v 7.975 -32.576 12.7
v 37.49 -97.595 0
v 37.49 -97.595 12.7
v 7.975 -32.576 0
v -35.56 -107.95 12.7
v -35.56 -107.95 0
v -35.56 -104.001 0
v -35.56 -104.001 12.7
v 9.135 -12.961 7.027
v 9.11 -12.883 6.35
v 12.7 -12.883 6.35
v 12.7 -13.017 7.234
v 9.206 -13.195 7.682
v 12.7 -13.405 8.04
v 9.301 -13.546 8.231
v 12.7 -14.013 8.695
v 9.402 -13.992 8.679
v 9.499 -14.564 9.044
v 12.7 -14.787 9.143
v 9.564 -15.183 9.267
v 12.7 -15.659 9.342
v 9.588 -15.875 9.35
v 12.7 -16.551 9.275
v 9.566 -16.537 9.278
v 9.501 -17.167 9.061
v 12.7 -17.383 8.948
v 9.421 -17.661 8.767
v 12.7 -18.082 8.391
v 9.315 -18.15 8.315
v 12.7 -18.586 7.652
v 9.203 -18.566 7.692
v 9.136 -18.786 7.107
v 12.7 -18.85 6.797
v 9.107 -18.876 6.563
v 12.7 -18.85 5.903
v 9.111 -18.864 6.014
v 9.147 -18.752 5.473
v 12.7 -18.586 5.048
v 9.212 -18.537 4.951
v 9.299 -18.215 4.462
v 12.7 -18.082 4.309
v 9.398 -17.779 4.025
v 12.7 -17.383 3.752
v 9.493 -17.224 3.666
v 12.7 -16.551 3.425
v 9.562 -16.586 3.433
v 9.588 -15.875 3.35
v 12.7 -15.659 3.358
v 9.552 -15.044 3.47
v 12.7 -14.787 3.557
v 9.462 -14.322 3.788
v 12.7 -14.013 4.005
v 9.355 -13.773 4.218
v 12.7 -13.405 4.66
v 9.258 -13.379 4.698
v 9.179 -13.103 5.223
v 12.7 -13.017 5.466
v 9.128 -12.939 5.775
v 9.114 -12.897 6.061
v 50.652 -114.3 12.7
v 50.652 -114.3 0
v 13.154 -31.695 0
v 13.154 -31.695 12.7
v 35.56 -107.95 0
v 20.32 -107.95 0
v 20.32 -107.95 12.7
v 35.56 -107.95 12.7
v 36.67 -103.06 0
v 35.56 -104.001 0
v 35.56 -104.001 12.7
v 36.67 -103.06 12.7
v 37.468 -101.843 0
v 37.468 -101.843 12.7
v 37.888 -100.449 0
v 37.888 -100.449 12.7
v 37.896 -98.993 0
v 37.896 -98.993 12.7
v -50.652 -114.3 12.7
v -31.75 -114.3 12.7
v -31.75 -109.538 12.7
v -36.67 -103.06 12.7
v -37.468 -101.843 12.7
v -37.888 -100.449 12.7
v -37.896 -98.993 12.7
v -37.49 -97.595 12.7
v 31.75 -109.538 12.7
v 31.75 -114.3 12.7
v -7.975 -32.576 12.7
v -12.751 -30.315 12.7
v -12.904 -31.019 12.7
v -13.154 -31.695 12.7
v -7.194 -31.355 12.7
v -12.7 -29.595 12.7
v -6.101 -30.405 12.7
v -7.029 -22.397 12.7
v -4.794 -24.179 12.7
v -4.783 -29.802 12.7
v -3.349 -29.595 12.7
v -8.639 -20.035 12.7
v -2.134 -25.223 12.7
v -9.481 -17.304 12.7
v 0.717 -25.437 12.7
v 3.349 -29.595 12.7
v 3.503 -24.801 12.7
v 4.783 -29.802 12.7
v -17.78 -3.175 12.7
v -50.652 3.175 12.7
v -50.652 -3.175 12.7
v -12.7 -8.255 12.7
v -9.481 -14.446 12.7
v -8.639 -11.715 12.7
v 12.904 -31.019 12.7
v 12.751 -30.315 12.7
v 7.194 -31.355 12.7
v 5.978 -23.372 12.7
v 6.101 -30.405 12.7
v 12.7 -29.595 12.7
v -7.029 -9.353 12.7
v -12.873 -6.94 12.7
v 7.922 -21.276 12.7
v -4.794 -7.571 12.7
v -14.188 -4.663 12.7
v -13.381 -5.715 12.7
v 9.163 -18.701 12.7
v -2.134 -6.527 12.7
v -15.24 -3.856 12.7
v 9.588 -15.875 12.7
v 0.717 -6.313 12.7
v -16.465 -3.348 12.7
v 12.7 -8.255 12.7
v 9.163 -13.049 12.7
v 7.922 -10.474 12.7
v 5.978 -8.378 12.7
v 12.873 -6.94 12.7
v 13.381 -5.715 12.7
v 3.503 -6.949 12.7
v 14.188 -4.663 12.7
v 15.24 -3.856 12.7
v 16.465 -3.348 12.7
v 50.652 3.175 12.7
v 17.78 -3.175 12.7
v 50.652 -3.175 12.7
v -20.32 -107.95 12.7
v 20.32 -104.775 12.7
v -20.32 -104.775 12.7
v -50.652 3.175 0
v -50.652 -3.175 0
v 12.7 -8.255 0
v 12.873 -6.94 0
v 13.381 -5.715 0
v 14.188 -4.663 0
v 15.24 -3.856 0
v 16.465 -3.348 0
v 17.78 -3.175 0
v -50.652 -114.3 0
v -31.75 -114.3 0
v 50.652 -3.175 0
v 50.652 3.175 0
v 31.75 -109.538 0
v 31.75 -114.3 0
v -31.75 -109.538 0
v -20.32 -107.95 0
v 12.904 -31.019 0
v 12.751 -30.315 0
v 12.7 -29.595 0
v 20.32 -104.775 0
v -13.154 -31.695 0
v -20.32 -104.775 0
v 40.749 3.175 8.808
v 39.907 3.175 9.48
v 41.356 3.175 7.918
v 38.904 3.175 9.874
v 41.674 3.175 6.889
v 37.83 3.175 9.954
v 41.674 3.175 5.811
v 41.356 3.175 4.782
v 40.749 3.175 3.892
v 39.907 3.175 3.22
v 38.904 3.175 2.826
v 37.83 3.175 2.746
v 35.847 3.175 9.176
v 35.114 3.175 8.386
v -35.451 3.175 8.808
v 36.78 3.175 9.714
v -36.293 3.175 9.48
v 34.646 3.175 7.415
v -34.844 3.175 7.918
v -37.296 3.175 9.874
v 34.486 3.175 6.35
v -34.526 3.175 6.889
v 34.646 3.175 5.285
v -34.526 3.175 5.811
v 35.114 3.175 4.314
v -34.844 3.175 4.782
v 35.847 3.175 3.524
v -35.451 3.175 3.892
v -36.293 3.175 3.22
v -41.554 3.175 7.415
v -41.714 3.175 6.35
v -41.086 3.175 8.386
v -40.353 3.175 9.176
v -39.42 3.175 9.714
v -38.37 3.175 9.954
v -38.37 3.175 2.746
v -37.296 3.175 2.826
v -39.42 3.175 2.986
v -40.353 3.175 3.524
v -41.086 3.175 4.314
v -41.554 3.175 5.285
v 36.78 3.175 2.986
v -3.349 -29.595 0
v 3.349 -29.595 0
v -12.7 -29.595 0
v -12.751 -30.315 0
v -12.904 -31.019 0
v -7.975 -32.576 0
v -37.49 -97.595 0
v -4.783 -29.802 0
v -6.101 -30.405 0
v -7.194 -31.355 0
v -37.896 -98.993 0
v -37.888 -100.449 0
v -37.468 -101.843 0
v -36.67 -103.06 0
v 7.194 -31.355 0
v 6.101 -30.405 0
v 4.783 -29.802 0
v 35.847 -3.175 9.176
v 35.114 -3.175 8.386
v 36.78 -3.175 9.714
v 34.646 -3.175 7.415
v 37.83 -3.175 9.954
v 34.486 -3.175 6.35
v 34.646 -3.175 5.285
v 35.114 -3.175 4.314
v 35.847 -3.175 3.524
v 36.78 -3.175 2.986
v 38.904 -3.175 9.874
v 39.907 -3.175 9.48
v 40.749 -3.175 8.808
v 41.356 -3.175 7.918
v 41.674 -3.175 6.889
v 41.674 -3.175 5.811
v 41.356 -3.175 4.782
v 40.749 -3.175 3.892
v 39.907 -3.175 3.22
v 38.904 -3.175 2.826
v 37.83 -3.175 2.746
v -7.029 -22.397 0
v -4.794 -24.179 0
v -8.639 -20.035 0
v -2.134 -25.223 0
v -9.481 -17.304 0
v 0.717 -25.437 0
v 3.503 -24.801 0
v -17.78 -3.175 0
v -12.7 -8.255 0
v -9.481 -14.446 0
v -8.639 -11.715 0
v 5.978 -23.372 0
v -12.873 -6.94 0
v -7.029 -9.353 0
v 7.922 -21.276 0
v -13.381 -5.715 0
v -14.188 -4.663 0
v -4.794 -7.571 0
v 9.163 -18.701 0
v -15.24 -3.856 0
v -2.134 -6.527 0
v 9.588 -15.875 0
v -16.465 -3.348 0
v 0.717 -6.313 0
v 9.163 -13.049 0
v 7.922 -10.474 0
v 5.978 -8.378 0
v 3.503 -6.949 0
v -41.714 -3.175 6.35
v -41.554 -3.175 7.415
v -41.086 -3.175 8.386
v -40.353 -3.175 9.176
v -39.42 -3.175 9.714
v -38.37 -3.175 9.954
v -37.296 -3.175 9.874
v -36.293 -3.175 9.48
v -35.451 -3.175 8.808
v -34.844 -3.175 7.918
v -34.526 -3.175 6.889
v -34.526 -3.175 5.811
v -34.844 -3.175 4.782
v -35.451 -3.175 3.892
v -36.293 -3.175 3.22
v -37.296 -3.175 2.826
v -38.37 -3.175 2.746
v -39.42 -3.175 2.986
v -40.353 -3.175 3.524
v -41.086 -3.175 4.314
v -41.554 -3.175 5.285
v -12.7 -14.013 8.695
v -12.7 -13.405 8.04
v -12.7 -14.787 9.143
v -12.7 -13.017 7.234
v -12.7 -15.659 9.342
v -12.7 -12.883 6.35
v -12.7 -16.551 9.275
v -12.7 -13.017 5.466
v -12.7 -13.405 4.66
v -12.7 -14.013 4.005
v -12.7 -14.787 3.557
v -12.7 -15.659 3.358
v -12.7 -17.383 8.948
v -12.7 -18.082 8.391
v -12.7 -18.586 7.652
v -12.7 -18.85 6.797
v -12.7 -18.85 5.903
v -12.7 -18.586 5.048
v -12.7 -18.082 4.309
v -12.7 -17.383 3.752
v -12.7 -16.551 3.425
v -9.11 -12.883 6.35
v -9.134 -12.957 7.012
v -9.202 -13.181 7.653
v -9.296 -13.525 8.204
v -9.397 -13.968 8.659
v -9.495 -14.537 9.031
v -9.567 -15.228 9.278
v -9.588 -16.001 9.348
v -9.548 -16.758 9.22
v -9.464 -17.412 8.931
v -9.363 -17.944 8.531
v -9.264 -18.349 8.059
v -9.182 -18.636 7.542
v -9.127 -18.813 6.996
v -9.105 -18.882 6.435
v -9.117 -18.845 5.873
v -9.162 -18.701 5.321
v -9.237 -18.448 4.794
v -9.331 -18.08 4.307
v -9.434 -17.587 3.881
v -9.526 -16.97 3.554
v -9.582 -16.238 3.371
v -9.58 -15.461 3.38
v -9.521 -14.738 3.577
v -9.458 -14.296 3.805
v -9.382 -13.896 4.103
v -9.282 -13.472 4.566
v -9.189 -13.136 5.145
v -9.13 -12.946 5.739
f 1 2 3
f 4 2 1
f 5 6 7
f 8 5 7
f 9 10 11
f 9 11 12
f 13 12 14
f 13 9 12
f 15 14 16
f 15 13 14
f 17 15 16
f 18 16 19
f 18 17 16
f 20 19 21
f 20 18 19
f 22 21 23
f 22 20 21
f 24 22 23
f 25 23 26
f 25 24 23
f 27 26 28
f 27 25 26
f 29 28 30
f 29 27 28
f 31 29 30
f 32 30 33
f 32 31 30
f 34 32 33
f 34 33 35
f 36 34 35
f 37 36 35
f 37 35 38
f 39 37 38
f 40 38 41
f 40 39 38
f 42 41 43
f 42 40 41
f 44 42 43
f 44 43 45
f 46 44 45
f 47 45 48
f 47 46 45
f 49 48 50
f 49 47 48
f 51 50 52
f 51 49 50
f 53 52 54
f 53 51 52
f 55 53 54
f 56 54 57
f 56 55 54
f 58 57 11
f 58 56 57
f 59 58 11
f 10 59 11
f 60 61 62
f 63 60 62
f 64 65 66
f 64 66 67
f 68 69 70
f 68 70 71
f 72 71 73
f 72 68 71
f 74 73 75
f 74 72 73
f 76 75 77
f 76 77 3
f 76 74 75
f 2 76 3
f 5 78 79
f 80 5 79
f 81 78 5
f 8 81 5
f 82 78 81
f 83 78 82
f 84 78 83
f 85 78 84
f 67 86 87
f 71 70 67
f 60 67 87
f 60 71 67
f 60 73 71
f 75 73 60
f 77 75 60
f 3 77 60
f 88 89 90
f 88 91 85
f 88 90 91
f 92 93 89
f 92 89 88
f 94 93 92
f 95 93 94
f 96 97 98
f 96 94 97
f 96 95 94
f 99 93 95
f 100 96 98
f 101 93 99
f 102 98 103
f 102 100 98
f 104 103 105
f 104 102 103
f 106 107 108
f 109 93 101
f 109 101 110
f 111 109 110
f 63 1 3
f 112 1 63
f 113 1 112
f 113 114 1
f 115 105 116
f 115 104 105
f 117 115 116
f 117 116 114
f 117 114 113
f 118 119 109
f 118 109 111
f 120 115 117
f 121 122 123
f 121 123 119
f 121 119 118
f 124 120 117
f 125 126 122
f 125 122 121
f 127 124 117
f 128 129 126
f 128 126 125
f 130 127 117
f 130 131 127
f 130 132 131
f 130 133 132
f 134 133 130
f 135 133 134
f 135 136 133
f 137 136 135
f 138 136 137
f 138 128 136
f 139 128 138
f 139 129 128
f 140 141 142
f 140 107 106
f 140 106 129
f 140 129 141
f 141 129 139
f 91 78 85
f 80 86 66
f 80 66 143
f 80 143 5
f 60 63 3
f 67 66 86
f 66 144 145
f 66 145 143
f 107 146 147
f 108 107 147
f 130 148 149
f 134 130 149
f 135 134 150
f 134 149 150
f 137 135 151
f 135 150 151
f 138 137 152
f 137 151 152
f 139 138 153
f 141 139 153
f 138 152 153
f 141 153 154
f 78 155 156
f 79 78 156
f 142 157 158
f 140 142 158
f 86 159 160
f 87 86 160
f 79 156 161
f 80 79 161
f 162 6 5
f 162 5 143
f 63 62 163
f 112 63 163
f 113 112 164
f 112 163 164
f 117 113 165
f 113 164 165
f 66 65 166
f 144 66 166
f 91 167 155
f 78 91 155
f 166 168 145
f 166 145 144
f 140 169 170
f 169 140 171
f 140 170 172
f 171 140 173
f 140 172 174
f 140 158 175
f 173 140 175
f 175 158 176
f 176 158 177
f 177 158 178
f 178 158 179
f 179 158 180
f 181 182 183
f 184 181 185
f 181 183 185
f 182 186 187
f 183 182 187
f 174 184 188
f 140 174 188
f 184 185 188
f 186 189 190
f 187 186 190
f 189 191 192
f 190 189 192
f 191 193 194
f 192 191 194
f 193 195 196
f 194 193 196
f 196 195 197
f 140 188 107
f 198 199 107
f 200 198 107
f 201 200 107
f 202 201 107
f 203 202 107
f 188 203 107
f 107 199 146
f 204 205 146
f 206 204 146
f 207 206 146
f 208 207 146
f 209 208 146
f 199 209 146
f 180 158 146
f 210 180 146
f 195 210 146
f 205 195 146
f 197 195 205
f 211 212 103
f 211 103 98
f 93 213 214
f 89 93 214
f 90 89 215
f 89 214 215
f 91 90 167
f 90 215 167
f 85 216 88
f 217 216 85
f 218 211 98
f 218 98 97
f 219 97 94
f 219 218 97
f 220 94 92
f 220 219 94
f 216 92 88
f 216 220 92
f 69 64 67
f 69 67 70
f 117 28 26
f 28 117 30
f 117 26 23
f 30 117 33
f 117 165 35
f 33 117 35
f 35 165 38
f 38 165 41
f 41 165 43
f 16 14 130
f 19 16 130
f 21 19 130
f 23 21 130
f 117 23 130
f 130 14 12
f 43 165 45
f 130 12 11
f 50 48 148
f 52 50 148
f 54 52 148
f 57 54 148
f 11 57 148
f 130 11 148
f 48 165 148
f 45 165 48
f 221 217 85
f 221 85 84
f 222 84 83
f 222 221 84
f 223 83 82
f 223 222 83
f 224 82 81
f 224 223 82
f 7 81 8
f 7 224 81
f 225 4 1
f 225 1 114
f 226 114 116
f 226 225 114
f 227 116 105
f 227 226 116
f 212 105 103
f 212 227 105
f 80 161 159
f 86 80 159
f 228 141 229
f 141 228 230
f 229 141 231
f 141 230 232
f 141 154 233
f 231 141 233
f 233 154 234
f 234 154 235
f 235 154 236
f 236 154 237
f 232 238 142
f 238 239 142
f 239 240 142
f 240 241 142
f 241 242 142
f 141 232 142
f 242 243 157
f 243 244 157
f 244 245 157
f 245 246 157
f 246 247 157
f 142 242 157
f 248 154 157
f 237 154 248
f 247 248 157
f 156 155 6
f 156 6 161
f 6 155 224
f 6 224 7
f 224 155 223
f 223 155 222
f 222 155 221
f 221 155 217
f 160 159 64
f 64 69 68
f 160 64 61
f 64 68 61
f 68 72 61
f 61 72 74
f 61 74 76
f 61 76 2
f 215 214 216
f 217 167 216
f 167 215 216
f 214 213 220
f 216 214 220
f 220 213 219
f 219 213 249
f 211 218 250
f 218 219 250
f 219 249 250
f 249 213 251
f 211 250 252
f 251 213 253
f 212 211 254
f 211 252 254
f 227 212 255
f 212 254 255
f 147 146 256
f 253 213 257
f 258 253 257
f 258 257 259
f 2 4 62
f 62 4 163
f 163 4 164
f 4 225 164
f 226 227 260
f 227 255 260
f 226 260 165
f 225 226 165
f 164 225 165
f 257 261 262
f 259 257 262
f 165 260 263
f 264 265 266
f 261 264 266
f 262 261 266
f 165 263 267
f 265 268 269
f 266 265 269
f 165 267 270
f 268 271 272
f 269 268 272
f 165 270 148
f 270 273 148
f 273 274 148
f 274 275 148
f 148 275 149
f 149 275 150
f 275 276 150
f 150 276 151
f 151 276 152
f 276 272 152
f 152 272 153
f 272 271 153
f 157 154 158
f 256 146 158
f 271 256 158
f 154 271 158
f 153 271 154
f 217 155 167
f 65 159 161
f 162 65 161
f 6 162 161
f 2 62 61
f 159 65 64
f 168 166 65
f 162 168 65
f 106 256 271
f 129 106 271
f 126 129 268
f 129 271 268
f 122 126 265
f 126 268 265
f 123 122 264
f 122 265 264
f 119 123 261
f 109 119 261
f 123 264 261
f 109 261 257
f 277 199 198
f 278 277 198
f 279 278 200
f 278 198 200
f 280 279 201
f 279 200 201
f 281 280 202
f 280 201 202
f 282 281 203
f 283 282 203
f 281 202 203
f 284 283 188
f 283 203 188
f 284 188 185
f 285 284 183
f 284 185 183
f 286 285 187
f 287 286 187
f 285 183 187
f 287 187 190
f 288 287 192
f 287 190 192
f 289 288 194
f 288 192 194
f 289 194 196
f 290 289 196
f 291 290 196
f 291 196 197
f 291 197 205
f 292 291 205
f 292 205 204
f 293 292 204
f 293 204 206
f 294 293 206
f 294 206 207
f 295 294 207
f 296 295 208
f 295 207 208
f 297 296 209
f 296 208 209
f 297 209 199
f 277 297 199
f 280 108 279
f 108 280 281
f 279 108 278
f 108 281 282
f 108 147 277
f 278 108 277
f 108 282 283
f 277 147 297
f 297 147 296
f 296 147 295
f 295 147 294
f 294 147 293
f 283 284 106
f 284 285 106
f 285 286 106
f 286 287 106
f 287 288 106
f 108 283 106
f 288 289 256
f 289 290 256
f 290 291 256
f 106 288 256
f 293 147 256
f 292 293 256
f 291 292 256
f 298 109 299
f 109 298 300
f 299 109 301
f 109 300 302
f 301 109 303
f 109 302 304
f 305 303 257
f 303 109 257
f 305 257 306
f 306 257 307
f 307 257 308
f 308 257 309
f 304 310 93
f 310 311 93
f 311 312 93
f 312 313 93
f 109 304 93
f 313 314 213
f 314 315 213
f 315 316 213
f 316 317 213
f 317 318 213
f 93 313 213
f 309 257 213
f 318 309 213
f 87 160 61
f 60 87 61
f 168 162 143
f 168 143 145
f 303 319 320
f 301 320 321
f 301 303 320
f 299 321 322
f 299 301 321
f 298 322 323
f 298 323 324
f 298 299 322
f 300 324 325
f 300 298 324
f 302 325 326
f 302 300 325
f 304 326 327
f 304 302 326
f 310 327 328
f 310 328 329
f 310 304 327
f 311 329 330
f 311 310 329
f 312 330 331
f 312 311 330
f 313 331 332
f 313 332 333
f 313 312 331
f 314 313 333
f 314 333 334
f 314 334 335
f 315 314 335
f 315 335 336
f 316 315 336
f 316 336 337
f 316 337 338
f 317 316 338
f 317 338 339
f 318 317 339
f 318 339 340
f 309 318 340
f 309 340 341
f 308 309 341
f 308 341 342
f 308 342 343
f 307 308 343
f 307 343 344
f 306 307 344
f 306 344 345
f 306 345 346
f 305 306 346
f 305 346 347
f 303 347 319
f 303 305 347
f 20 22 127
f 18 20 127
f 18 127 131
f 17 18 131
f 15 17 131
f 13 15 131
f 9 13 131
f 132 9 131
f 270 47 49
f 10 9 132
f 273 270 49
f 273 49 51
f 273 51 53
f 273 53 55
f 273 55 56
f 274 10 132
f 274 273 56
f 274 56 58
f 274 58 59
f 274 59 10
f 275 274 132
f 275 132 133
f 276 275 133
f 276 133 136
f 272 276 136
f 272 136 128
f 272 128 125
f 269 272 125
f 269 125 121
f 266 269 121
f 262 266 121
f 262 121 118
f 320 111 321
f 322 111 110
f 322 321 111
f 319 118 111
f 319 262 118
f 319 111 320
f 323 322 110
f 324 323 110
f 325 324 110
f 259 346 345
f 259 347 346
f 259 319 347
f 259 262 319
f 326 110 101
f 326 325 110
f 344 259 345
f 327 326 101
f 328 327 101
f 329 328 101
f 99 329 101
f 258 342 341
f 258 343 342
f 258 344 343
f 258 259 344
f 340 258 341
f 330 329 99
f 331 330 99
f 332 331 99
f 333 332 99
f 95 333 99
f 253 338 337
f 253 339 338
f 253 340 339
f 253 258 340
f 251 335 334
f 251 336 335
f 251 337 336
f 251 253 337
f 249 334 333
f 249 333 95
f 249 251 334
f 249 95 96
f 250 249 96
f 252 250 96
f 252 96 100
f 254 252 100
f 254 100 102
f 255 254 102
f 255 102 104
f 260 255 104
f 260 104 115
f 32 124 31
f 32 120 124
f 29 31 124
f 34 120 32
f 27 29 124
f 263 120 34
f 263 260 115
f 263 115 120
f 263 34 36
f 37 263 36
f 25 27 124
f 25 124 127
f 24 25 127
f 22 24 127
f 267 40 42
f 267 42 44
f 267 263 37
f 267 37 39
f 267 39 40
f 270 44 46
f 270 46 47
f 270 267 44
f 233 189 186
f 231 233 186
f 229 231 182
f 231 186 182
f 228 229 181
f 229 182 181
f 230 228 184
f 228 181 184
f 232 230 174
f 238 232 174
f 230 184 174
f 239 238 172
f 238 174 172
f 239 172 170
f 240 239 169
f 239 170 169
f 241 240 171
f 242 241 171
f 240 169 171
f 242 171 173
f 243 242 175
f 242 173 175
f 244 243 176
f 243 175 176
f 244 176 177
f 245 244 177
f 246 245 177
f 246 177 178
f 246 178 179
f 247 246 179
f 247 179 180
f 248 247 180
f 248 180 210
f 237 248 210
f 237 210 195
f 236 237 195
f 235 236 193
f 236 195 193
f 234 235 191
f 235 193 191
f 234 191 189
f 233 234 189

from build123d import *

# Parameters (mm, degrees)
SKETCH3_R               = 9.5885
BOSS_EXTRUDE1_DEPTH     = 12.7
SKETCH4_R               = 3.614257139
CUT_EXTRUDE1_DEPTH      = 6.35
CUT_EXTRUDE2_START      = -12.7
CUT_EXTRUDE2_OUTLINE_R  = 3
CUT_EXTRUDE2_DEPTH      = 25.4
CUT_EXTRUDE3_DEPTH      = 126.664030474
CUT_EXTRUDE3_DEPTH_BACK = 126.664030474
SKETCH8_W               = 15.24
SKETCH8_H               = 5.08


# Read off the part's stored shape, not the designer's step: Cut-Extrude2
with BuildPart() as part:
    # Sketch3 → Boss-Extrude1 (new body)
    with BuildSketch(Plane.XY):
        with BuildLine():
            Line((50.652428891, 3.175), (-50.652428891, 3.175))
            Line((-50.652428891, 3.175), (-50.652428891, -3.175))
            Line((-50.652428891, -3.175), (-17.78, -3.175))
            ThreePointArc((-17.78, -3.175), (-14.187897552, -4.662897552), (-12.7, -8.255))
            Line((-12.7, -8.255), (-12.7, -29.595434395))
            ThreePointArc((-12.7, -29.595434395), (-12.814872576, -30.66963627), (-13.154295145, -31.69525691))
            Line((-13.154295145, -31.69525691), (-50.652428891, -114.3))
            Line((-50.652428891, -114.3), (-31.75, -114.3))
            Line((-31.75, -114.3), (-31.75, -109.5375))
            Line((-31.75, -109.5375), (31.75, -109.5375))
            Line((31.75, -109.5375), (31.75, -114.3))
            Line((31.75, -114.3), (50.652428891, -114.3))
            Line((50.652428891, -114.3), (13.154295145, -31.69525691))
            ThreePointArc((13.154295145, -31.69525691), (12.814872576, -30.66963627), (12.7, -29.595434395))
            Line((12.7, -29.595434395), (12.7, -8.255))
            ThreePointArc((12.7, -8.255), (14.187897552, -4.662897552), (17.78, -3.175))
            Line((17.78, -3.175), (50.652428891, -3.175))
            Line((50.652428891, -3.175), (50.652428891, 3.175))
        make_face()
        with Locations((0, -15.875)):
            Circle(SKETCH3_R, mode=Mode.SUBTRACT)
        with BuildLine():
            Line((-7.97501727, -32.575611881), (-37.490421301, -97.595177486))
            ThreePointArc((-37.490421301, -97.595177486), (-37.135167146, -102.446299841), (-32.864716446, -104.775))
            Line((-32.864716446, -104.775), (0, -104.775))
            Line((0, -104.775), (32.864716446, -104.775))
            ThreePointArc((32.864716446, -104.775), (37.135167146, -102.446299841), (37.490421301, -97.595177486))
            Line((37.490421301, -97.595177486), (7.97501727, -32.575611881))
            ThreePointArc((7.97501727, -32.575611881), (6.100612256, -30.404983695), (3.349312415, -29.595434395))
            Line((3.349312415, -29.595434395), (-3.349312415, -29.595434395))
            ThreePointArc((-3.349312415, -29.595434395), (-6.100612256, -30.404983695), (-7.97501727, -32.575611881))
        make_face(mode=Mode.SUBTRACT)
    extrude(amount=BOSS_EXTRUDE1_DEPTH)

    # Sketch4 → Cut-Extrude1 (cut)
    with BuildSketch(Plane(origin=(0, 3.175, 0), x_dir=(1, 0, 0), z_dir=(0, 1, 0))):
        with Locations(Location((-38.1, -6.35, 0), (0, 0, 180))):
            Circle(SKETCH4_R)
        with Locations(Location((38.1, -6.35, 0), (0, 0, 180))):
            Circle(SKETCH4_R)
    extrude(amount=-CUT_EXTRUDE1_DEPTH, mode=Mode.SUBTRACT)

    # Cut-Extrude2 outline → Cut-Extrude2 (cut)
    with BuildSketch(Plane.YZ.offset(CUT_EXTRUDE2_START)):
        with Locations((-15.883331584, 6.35)):
            Circle(CUT_EXTRUDE2_OUTLINE_R)
    extrude(amount=CUT_EXTRUDE2_DEPTH, mode=Mode.SUBTRACT)

    # Sketch8 → Cut-Extrude3 (cut, two sides: drawn at the far end of the back side and taken through both)
    with BuildSketch(Plane.XY.offset(12.7).offset(-CUT_EXTRUDE3_DEPTH_BACK)):
        with Locations((-27.94, -105.41)):
            Rectangle(SKETCH8_W, SKETCH8_H)
        with Locations((27.94, -105.41)):
            Rectangle(SKETCH8_W, SKETCH8_H)
    extrude(amount=CUT_EXTRUDE3_DEPTH + CUT_EXTRUDE3_DEPTH_BACK, mode=Mode.SUBTRACT)


solid = part.part
